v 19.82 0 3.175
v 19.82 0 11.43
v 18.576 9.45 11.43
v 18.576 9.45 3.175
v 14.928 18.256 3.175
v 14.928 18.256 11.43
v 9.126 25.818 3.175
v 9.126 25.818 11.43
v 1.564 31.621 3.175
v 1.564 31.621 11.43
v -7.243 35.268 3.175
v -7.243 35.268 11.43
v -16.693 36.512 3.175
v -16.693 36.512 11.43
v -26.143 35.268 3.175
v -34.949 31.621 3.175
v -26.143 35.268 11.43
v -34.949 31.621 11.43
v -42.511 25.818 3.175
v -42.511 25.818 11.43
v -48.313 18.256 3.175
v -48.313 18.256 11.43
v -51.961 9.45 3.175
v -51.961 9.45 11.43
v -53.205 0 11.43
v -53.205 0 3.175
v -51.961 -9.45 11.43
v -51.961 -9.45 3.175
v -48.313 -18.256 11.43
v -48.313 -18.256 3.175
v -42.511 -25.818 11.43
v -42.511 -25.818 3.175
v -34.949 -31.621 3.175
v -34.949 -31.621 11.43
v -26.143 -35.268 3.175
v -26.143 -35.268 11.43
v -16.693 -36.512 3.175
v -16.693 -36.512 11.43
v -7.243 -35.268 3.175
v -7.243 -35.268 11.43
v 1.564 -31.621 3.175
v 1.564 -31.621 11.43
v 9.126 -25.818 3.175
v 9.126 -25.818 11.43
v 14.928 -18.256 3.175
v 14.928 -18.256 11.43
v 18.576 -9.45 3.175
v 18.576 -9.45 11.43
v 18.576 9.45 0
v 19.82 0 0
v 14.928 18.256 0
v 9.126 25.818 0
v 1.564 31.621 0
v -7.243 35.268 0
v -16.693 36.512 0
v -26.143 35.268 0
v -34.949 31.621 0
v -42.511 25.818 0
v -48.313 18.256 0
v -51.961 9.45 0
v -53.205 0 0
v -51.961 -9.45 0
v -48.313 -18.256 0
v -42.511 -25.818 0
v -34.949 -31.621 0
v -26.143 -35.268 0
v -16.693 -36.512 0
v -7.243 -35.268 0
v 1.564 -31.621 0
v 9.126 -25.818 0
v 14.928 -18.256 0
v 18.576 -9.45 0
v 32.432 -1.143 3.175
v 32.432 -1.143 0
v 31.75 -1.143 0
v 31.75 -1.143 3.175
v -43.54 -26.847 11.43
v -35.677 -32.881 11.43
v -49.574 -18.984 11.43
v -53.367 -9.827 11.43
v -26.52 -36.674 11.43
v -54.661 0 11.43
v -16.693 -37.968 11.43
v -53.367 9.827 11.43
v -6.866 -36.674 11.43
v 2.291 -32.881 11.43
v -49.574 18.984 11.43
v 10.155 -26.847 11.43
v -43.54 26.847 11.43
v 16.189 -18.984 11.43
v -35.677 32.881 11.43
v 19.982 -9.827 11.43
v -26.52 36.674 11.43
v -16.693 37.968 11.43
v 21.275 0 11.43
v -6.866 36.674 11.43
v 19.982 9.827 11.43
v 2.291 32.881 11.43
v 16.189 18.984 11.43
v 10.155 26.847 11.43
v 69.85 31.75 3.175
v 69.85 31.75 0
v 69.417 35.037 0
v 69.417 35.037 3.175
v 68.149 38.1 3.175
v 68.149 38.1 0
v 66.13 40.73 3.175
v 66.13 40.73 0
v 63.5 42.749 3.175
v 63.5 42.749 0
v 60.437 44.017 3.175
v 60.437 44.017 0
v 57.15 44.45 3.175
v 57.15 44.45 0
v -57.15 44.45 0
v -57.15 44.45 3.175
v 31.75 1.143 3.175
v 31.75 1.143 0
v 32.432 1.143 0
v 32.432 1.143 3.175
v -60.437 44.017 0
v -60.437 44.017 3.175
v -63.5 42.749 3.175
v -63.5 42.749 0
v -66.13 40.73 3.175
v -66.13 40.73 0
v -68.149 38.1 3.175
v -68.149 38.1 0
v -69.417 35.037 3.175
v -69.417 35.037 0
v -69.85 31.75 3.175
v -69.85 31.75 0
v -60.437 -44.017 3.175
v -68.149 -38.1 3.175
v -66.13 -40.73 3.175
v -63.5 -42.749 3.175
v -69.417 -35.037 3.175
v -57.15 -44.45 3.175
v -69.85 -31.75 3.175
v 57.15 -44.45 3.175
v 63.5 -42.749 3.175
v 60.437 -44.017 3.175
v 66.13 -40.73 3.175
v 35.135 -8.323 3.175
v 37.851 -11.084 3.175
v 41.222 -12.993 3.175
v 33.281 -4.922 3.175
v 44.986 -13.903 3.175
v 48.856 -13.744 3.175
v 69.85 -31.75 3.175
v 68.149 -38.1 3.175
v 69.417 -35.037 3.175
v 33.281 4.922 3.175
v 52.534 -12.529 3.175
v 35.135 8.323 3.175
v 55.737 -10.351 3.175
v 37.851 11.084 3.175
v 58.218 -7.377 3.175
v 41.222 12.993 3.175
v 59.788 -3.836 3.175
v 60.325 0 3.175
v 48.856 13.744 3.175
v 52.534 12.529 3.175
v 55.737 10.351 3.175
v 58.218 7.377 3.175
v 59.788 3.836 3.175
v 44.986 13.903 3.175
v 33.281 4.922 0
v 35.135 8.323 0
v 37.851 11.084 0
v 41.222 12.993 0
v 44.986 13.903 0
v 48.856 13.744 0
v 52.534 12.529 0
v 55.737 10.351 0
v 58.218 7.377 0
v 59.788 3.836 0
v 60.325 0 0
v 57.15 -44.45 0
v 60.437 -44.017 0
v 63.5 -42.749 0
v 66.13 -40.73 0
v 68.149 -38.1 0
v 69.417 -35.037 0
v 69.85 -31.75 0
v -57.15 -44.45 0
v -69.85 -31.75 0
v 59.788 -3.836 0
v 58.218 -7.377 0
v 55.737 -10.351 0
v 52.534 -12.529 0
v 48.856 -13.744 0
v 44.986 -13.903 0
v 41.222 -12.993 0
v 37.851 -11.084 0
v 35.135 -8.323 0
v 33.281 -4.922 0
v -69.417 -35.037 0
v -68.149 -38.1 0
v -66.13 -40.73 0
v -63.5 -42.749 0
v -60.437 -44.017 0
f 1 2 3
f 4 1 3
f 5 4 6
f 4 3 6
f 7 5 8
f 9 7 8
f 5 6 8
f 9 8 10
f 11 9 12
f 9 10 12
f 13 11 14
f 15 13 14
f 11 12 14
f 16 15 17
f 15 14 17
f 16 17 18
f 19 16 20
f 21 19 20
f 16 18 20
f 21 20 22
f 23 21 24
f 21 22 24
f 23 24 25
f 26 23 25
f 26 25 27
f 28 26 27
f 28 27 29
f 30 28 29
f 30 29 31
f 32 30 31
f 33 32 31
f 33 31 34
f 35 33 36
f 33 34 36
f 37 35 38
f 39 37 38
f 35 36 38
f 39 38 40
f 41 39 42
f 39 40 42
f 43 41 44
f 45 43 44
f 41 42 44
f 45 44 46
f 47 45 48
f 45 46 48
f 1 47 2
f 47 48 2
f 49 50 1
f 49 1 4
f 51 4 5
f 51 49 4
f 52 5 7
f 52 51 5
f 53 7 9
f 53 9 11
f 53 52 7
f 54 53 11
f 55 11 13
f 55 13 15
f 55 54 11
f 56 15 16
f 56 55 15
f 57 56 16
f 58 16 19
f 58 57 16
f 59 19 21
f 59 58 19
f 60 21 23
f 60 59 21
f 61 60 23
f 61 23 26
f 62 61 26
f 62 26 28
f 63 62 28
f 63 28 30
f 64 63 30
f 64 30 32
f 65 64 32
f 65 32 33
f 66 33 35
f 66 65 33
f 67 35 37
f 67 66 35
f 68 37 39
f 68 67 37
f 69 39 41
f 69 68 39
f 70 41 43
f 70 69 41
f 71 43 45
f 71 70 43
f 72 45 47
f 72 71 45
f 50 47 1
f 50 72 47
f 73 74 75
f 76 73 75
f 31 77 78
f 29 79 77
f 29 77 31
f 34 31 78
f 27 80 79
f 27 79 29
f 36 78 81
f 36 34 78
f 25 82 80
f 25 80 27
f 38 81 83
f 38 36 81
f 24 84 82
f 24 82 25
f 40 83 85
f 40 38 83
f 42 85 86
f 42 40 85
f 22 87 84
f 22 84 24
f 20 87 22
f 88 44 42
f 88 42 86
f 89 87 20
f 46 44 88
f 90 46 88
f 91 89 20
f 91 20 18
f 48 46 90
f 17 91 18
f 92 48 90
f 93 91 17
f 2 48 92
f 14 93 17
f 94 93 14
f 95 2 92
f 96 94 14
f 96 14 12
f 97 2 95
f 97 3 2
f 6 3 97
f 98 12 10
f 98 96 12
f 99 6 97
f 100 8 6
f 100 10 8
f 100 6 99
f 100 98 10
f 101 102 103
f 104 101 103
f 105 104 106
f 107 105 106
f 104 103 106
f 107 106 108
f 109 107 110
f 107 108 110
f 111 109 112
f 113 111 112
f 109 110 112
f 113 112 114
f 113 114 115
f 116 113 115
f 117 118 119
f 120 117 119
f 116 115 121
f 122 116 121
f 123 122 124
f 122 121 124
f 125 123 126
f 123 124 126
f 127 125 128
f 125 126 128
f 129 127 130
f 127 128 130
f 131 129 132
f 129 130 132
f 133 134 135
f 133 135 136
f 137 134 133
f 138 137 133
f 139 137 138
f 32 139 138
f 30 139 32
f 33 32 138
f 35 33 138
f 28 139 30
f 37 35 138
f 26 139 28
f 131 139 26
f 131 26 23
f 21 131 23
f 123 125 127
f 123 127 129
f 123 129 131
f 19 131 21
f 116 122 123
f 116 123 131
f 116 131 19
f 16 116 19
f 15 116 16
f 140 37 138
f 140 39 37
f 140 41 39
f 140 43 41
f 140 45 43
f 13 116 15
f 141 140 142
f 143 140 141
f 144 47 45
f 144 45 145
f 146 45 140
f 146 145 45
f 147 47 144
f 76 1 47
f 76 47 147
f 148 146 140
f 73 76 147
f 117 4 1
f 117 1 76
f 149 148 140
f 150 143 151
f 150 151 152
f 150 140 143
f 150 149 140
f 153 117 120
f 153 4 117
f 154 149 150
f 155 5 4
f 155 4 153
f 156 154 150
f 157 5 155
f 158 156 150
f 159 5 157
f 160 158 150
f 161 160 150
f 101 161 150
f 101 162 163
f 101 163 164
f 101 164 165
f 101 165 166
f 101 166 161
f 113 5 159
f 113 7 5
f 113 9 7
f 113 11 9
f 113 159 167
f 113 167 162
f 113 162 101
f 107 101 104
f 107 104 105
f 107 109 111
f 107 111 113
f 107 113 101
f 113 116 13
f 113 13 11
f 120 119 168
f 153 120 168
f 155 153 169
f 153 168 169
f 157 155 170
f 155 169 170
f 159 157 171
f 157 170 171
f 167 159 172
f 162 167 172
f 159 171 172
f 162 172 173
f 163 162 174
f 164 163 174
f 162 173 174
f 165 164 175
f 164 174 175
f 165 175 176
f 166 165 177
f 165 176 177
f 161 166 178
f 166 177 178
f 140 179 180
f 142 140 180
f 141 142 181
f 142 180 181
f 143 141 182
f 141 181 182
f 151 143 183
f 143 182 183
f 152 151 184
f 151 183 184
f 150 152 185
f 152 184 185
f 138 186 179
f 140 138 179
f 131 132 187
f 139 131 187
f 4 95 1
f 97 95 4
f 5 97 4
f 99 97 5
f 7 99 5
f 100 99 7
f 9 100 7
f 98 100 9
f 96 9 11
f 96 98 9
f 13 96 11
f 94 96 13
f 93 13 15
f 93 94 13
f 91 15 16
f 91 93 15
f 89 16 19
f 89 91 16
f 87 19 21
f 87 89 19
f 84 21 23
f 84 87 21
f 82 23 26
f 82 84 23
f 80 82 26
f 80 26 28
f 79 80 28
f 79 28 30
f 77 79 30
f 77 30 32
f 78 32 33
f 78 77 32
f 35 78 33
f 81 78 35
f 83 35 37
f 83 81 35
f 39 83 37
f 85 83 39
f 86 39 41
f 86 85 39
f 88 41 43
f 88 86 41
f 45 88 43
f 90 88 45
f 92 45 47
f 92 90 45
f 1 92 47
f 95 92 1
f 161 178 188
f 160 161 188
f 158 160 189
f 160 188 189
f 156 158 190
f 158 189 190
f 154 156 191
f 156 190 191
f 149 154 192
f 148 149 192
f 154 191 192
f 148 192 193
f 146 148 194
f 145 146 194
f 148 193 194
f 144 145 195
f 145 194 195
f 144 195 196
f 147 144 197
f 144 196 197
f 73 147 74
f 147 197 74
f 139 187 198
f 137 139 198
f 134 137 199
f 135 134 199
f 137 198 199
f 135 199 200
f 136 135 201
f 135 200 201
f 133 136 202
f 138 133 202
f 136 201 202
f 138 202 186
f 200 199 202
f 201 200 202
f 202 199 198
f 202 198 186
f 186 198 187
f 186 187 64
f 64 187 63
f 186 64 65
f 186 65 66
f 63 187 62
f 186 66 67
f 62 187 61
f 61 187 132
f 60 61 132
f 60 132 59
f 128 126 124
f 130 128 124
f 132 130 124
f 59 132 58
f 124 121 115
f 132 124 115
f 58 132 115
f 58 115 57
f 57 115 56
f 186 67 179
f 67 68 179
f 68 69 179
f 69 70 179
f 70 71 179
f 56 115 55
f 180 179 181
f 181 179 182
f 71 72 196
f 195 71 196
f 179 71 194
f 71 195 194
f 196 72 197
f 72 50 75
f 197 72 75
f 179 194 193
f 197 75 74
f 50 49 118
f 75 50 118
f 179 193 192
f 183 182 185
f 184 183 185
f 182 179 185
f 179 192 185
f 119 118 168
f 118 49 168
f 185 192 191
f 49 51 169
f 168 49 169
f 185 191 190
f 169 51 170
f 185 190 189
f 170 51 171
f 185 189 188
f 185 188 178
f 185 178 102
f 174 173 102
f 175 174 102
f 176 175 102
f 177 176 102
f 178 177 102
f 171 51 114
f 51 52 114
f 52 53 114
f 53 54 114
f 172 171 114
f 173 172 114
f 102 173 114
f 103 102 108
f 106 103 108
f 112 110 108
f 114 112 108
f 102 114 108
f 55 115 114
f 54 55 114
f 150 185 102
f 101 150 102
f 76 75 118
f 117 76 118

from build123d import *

# Parameters (mm, degrees)
F0_R     = 36.5125
F1_DEPTH = 3.175
F2_R     = 36.5125
F3_DEPTH = 8.255
F3_TAPER = -10
F4_R     = 36.5125
F5_DEPTH = 8.255


with BuildPart() as f1:
    # F0 (on Top) → F1 (new body)
    with BuildSketch(Plane.XY):
        with BuildLine():
            ThreePointArc((69.85, 31.75), (66.1302561211, 40.7302561211), (57.15, 44.45))
            Line((57.15, 44.45), (-57.15, 44.45))
            ThreePointArc((-57.15, 44.45), (-66.1302561211, 40.7302561211), (-69.85, 31.75))
            Line((-69.85, 31.75), (-69.85, -31.75))
            ThreePointArc((-69.85, -31.75), (-66.1302561211, -40.7302561211), (-57.15, -44.45))
            Line((-57.15, -44.45), (57.15, -44.45))
            ThreePointArc((57.15, -44.45), (66.1302561211, -40.7302561211), (69.85, -31.75))
            Line((69.85, -31.75), (69.85, 0))
            Line((69.85, 0), (69.85, 31.75))
        make_face()
        with BuildLine():
            ThreePointArc((32.4318376078, 1.143), (46.9269796241, 13.9582856866), (60.325, 0))
            ThreePointArc((60.325, 0), (46.9269796241, -13.9582856866), (32.4318376078, -1.143))
            Line((32.4318376078, -1.143), (31.75, -1.143))
            Line((31.75, -1.143), (31.75, 1.143))
            Line((31.75, 1.143), (32.4318376078, 1.143))
        make_face(mode=Mode.SUBTRACT)
        with Locations((-16.6927333921, 0)):
            Circle(F0_R, mode=Mode.SUBTRACT)
    extrude(amount=F1_DEPTH)


with BuildPart() as f3:
    # F2 (on face) → F3 (new body)
    with BuildSketch(Plane.XY.offset(3.175)):
        with Locations((-16.6927333921, 0)):
            Circle(F2_R)
    extrude(amount=F3_DEPTH, taper=F3_TAPER)

    # F4 (on face) → F5 (cut)
    with BuildSketch(Plane.XY.offset(11.43)):
        with Locations((-16.6927333921, 0)):
            Circle(F4_R)
    extrude(amount=-F5_DEPTH, mode=Mode.SUBTRACT)


solid = Compound([f1.part, f3.part])
